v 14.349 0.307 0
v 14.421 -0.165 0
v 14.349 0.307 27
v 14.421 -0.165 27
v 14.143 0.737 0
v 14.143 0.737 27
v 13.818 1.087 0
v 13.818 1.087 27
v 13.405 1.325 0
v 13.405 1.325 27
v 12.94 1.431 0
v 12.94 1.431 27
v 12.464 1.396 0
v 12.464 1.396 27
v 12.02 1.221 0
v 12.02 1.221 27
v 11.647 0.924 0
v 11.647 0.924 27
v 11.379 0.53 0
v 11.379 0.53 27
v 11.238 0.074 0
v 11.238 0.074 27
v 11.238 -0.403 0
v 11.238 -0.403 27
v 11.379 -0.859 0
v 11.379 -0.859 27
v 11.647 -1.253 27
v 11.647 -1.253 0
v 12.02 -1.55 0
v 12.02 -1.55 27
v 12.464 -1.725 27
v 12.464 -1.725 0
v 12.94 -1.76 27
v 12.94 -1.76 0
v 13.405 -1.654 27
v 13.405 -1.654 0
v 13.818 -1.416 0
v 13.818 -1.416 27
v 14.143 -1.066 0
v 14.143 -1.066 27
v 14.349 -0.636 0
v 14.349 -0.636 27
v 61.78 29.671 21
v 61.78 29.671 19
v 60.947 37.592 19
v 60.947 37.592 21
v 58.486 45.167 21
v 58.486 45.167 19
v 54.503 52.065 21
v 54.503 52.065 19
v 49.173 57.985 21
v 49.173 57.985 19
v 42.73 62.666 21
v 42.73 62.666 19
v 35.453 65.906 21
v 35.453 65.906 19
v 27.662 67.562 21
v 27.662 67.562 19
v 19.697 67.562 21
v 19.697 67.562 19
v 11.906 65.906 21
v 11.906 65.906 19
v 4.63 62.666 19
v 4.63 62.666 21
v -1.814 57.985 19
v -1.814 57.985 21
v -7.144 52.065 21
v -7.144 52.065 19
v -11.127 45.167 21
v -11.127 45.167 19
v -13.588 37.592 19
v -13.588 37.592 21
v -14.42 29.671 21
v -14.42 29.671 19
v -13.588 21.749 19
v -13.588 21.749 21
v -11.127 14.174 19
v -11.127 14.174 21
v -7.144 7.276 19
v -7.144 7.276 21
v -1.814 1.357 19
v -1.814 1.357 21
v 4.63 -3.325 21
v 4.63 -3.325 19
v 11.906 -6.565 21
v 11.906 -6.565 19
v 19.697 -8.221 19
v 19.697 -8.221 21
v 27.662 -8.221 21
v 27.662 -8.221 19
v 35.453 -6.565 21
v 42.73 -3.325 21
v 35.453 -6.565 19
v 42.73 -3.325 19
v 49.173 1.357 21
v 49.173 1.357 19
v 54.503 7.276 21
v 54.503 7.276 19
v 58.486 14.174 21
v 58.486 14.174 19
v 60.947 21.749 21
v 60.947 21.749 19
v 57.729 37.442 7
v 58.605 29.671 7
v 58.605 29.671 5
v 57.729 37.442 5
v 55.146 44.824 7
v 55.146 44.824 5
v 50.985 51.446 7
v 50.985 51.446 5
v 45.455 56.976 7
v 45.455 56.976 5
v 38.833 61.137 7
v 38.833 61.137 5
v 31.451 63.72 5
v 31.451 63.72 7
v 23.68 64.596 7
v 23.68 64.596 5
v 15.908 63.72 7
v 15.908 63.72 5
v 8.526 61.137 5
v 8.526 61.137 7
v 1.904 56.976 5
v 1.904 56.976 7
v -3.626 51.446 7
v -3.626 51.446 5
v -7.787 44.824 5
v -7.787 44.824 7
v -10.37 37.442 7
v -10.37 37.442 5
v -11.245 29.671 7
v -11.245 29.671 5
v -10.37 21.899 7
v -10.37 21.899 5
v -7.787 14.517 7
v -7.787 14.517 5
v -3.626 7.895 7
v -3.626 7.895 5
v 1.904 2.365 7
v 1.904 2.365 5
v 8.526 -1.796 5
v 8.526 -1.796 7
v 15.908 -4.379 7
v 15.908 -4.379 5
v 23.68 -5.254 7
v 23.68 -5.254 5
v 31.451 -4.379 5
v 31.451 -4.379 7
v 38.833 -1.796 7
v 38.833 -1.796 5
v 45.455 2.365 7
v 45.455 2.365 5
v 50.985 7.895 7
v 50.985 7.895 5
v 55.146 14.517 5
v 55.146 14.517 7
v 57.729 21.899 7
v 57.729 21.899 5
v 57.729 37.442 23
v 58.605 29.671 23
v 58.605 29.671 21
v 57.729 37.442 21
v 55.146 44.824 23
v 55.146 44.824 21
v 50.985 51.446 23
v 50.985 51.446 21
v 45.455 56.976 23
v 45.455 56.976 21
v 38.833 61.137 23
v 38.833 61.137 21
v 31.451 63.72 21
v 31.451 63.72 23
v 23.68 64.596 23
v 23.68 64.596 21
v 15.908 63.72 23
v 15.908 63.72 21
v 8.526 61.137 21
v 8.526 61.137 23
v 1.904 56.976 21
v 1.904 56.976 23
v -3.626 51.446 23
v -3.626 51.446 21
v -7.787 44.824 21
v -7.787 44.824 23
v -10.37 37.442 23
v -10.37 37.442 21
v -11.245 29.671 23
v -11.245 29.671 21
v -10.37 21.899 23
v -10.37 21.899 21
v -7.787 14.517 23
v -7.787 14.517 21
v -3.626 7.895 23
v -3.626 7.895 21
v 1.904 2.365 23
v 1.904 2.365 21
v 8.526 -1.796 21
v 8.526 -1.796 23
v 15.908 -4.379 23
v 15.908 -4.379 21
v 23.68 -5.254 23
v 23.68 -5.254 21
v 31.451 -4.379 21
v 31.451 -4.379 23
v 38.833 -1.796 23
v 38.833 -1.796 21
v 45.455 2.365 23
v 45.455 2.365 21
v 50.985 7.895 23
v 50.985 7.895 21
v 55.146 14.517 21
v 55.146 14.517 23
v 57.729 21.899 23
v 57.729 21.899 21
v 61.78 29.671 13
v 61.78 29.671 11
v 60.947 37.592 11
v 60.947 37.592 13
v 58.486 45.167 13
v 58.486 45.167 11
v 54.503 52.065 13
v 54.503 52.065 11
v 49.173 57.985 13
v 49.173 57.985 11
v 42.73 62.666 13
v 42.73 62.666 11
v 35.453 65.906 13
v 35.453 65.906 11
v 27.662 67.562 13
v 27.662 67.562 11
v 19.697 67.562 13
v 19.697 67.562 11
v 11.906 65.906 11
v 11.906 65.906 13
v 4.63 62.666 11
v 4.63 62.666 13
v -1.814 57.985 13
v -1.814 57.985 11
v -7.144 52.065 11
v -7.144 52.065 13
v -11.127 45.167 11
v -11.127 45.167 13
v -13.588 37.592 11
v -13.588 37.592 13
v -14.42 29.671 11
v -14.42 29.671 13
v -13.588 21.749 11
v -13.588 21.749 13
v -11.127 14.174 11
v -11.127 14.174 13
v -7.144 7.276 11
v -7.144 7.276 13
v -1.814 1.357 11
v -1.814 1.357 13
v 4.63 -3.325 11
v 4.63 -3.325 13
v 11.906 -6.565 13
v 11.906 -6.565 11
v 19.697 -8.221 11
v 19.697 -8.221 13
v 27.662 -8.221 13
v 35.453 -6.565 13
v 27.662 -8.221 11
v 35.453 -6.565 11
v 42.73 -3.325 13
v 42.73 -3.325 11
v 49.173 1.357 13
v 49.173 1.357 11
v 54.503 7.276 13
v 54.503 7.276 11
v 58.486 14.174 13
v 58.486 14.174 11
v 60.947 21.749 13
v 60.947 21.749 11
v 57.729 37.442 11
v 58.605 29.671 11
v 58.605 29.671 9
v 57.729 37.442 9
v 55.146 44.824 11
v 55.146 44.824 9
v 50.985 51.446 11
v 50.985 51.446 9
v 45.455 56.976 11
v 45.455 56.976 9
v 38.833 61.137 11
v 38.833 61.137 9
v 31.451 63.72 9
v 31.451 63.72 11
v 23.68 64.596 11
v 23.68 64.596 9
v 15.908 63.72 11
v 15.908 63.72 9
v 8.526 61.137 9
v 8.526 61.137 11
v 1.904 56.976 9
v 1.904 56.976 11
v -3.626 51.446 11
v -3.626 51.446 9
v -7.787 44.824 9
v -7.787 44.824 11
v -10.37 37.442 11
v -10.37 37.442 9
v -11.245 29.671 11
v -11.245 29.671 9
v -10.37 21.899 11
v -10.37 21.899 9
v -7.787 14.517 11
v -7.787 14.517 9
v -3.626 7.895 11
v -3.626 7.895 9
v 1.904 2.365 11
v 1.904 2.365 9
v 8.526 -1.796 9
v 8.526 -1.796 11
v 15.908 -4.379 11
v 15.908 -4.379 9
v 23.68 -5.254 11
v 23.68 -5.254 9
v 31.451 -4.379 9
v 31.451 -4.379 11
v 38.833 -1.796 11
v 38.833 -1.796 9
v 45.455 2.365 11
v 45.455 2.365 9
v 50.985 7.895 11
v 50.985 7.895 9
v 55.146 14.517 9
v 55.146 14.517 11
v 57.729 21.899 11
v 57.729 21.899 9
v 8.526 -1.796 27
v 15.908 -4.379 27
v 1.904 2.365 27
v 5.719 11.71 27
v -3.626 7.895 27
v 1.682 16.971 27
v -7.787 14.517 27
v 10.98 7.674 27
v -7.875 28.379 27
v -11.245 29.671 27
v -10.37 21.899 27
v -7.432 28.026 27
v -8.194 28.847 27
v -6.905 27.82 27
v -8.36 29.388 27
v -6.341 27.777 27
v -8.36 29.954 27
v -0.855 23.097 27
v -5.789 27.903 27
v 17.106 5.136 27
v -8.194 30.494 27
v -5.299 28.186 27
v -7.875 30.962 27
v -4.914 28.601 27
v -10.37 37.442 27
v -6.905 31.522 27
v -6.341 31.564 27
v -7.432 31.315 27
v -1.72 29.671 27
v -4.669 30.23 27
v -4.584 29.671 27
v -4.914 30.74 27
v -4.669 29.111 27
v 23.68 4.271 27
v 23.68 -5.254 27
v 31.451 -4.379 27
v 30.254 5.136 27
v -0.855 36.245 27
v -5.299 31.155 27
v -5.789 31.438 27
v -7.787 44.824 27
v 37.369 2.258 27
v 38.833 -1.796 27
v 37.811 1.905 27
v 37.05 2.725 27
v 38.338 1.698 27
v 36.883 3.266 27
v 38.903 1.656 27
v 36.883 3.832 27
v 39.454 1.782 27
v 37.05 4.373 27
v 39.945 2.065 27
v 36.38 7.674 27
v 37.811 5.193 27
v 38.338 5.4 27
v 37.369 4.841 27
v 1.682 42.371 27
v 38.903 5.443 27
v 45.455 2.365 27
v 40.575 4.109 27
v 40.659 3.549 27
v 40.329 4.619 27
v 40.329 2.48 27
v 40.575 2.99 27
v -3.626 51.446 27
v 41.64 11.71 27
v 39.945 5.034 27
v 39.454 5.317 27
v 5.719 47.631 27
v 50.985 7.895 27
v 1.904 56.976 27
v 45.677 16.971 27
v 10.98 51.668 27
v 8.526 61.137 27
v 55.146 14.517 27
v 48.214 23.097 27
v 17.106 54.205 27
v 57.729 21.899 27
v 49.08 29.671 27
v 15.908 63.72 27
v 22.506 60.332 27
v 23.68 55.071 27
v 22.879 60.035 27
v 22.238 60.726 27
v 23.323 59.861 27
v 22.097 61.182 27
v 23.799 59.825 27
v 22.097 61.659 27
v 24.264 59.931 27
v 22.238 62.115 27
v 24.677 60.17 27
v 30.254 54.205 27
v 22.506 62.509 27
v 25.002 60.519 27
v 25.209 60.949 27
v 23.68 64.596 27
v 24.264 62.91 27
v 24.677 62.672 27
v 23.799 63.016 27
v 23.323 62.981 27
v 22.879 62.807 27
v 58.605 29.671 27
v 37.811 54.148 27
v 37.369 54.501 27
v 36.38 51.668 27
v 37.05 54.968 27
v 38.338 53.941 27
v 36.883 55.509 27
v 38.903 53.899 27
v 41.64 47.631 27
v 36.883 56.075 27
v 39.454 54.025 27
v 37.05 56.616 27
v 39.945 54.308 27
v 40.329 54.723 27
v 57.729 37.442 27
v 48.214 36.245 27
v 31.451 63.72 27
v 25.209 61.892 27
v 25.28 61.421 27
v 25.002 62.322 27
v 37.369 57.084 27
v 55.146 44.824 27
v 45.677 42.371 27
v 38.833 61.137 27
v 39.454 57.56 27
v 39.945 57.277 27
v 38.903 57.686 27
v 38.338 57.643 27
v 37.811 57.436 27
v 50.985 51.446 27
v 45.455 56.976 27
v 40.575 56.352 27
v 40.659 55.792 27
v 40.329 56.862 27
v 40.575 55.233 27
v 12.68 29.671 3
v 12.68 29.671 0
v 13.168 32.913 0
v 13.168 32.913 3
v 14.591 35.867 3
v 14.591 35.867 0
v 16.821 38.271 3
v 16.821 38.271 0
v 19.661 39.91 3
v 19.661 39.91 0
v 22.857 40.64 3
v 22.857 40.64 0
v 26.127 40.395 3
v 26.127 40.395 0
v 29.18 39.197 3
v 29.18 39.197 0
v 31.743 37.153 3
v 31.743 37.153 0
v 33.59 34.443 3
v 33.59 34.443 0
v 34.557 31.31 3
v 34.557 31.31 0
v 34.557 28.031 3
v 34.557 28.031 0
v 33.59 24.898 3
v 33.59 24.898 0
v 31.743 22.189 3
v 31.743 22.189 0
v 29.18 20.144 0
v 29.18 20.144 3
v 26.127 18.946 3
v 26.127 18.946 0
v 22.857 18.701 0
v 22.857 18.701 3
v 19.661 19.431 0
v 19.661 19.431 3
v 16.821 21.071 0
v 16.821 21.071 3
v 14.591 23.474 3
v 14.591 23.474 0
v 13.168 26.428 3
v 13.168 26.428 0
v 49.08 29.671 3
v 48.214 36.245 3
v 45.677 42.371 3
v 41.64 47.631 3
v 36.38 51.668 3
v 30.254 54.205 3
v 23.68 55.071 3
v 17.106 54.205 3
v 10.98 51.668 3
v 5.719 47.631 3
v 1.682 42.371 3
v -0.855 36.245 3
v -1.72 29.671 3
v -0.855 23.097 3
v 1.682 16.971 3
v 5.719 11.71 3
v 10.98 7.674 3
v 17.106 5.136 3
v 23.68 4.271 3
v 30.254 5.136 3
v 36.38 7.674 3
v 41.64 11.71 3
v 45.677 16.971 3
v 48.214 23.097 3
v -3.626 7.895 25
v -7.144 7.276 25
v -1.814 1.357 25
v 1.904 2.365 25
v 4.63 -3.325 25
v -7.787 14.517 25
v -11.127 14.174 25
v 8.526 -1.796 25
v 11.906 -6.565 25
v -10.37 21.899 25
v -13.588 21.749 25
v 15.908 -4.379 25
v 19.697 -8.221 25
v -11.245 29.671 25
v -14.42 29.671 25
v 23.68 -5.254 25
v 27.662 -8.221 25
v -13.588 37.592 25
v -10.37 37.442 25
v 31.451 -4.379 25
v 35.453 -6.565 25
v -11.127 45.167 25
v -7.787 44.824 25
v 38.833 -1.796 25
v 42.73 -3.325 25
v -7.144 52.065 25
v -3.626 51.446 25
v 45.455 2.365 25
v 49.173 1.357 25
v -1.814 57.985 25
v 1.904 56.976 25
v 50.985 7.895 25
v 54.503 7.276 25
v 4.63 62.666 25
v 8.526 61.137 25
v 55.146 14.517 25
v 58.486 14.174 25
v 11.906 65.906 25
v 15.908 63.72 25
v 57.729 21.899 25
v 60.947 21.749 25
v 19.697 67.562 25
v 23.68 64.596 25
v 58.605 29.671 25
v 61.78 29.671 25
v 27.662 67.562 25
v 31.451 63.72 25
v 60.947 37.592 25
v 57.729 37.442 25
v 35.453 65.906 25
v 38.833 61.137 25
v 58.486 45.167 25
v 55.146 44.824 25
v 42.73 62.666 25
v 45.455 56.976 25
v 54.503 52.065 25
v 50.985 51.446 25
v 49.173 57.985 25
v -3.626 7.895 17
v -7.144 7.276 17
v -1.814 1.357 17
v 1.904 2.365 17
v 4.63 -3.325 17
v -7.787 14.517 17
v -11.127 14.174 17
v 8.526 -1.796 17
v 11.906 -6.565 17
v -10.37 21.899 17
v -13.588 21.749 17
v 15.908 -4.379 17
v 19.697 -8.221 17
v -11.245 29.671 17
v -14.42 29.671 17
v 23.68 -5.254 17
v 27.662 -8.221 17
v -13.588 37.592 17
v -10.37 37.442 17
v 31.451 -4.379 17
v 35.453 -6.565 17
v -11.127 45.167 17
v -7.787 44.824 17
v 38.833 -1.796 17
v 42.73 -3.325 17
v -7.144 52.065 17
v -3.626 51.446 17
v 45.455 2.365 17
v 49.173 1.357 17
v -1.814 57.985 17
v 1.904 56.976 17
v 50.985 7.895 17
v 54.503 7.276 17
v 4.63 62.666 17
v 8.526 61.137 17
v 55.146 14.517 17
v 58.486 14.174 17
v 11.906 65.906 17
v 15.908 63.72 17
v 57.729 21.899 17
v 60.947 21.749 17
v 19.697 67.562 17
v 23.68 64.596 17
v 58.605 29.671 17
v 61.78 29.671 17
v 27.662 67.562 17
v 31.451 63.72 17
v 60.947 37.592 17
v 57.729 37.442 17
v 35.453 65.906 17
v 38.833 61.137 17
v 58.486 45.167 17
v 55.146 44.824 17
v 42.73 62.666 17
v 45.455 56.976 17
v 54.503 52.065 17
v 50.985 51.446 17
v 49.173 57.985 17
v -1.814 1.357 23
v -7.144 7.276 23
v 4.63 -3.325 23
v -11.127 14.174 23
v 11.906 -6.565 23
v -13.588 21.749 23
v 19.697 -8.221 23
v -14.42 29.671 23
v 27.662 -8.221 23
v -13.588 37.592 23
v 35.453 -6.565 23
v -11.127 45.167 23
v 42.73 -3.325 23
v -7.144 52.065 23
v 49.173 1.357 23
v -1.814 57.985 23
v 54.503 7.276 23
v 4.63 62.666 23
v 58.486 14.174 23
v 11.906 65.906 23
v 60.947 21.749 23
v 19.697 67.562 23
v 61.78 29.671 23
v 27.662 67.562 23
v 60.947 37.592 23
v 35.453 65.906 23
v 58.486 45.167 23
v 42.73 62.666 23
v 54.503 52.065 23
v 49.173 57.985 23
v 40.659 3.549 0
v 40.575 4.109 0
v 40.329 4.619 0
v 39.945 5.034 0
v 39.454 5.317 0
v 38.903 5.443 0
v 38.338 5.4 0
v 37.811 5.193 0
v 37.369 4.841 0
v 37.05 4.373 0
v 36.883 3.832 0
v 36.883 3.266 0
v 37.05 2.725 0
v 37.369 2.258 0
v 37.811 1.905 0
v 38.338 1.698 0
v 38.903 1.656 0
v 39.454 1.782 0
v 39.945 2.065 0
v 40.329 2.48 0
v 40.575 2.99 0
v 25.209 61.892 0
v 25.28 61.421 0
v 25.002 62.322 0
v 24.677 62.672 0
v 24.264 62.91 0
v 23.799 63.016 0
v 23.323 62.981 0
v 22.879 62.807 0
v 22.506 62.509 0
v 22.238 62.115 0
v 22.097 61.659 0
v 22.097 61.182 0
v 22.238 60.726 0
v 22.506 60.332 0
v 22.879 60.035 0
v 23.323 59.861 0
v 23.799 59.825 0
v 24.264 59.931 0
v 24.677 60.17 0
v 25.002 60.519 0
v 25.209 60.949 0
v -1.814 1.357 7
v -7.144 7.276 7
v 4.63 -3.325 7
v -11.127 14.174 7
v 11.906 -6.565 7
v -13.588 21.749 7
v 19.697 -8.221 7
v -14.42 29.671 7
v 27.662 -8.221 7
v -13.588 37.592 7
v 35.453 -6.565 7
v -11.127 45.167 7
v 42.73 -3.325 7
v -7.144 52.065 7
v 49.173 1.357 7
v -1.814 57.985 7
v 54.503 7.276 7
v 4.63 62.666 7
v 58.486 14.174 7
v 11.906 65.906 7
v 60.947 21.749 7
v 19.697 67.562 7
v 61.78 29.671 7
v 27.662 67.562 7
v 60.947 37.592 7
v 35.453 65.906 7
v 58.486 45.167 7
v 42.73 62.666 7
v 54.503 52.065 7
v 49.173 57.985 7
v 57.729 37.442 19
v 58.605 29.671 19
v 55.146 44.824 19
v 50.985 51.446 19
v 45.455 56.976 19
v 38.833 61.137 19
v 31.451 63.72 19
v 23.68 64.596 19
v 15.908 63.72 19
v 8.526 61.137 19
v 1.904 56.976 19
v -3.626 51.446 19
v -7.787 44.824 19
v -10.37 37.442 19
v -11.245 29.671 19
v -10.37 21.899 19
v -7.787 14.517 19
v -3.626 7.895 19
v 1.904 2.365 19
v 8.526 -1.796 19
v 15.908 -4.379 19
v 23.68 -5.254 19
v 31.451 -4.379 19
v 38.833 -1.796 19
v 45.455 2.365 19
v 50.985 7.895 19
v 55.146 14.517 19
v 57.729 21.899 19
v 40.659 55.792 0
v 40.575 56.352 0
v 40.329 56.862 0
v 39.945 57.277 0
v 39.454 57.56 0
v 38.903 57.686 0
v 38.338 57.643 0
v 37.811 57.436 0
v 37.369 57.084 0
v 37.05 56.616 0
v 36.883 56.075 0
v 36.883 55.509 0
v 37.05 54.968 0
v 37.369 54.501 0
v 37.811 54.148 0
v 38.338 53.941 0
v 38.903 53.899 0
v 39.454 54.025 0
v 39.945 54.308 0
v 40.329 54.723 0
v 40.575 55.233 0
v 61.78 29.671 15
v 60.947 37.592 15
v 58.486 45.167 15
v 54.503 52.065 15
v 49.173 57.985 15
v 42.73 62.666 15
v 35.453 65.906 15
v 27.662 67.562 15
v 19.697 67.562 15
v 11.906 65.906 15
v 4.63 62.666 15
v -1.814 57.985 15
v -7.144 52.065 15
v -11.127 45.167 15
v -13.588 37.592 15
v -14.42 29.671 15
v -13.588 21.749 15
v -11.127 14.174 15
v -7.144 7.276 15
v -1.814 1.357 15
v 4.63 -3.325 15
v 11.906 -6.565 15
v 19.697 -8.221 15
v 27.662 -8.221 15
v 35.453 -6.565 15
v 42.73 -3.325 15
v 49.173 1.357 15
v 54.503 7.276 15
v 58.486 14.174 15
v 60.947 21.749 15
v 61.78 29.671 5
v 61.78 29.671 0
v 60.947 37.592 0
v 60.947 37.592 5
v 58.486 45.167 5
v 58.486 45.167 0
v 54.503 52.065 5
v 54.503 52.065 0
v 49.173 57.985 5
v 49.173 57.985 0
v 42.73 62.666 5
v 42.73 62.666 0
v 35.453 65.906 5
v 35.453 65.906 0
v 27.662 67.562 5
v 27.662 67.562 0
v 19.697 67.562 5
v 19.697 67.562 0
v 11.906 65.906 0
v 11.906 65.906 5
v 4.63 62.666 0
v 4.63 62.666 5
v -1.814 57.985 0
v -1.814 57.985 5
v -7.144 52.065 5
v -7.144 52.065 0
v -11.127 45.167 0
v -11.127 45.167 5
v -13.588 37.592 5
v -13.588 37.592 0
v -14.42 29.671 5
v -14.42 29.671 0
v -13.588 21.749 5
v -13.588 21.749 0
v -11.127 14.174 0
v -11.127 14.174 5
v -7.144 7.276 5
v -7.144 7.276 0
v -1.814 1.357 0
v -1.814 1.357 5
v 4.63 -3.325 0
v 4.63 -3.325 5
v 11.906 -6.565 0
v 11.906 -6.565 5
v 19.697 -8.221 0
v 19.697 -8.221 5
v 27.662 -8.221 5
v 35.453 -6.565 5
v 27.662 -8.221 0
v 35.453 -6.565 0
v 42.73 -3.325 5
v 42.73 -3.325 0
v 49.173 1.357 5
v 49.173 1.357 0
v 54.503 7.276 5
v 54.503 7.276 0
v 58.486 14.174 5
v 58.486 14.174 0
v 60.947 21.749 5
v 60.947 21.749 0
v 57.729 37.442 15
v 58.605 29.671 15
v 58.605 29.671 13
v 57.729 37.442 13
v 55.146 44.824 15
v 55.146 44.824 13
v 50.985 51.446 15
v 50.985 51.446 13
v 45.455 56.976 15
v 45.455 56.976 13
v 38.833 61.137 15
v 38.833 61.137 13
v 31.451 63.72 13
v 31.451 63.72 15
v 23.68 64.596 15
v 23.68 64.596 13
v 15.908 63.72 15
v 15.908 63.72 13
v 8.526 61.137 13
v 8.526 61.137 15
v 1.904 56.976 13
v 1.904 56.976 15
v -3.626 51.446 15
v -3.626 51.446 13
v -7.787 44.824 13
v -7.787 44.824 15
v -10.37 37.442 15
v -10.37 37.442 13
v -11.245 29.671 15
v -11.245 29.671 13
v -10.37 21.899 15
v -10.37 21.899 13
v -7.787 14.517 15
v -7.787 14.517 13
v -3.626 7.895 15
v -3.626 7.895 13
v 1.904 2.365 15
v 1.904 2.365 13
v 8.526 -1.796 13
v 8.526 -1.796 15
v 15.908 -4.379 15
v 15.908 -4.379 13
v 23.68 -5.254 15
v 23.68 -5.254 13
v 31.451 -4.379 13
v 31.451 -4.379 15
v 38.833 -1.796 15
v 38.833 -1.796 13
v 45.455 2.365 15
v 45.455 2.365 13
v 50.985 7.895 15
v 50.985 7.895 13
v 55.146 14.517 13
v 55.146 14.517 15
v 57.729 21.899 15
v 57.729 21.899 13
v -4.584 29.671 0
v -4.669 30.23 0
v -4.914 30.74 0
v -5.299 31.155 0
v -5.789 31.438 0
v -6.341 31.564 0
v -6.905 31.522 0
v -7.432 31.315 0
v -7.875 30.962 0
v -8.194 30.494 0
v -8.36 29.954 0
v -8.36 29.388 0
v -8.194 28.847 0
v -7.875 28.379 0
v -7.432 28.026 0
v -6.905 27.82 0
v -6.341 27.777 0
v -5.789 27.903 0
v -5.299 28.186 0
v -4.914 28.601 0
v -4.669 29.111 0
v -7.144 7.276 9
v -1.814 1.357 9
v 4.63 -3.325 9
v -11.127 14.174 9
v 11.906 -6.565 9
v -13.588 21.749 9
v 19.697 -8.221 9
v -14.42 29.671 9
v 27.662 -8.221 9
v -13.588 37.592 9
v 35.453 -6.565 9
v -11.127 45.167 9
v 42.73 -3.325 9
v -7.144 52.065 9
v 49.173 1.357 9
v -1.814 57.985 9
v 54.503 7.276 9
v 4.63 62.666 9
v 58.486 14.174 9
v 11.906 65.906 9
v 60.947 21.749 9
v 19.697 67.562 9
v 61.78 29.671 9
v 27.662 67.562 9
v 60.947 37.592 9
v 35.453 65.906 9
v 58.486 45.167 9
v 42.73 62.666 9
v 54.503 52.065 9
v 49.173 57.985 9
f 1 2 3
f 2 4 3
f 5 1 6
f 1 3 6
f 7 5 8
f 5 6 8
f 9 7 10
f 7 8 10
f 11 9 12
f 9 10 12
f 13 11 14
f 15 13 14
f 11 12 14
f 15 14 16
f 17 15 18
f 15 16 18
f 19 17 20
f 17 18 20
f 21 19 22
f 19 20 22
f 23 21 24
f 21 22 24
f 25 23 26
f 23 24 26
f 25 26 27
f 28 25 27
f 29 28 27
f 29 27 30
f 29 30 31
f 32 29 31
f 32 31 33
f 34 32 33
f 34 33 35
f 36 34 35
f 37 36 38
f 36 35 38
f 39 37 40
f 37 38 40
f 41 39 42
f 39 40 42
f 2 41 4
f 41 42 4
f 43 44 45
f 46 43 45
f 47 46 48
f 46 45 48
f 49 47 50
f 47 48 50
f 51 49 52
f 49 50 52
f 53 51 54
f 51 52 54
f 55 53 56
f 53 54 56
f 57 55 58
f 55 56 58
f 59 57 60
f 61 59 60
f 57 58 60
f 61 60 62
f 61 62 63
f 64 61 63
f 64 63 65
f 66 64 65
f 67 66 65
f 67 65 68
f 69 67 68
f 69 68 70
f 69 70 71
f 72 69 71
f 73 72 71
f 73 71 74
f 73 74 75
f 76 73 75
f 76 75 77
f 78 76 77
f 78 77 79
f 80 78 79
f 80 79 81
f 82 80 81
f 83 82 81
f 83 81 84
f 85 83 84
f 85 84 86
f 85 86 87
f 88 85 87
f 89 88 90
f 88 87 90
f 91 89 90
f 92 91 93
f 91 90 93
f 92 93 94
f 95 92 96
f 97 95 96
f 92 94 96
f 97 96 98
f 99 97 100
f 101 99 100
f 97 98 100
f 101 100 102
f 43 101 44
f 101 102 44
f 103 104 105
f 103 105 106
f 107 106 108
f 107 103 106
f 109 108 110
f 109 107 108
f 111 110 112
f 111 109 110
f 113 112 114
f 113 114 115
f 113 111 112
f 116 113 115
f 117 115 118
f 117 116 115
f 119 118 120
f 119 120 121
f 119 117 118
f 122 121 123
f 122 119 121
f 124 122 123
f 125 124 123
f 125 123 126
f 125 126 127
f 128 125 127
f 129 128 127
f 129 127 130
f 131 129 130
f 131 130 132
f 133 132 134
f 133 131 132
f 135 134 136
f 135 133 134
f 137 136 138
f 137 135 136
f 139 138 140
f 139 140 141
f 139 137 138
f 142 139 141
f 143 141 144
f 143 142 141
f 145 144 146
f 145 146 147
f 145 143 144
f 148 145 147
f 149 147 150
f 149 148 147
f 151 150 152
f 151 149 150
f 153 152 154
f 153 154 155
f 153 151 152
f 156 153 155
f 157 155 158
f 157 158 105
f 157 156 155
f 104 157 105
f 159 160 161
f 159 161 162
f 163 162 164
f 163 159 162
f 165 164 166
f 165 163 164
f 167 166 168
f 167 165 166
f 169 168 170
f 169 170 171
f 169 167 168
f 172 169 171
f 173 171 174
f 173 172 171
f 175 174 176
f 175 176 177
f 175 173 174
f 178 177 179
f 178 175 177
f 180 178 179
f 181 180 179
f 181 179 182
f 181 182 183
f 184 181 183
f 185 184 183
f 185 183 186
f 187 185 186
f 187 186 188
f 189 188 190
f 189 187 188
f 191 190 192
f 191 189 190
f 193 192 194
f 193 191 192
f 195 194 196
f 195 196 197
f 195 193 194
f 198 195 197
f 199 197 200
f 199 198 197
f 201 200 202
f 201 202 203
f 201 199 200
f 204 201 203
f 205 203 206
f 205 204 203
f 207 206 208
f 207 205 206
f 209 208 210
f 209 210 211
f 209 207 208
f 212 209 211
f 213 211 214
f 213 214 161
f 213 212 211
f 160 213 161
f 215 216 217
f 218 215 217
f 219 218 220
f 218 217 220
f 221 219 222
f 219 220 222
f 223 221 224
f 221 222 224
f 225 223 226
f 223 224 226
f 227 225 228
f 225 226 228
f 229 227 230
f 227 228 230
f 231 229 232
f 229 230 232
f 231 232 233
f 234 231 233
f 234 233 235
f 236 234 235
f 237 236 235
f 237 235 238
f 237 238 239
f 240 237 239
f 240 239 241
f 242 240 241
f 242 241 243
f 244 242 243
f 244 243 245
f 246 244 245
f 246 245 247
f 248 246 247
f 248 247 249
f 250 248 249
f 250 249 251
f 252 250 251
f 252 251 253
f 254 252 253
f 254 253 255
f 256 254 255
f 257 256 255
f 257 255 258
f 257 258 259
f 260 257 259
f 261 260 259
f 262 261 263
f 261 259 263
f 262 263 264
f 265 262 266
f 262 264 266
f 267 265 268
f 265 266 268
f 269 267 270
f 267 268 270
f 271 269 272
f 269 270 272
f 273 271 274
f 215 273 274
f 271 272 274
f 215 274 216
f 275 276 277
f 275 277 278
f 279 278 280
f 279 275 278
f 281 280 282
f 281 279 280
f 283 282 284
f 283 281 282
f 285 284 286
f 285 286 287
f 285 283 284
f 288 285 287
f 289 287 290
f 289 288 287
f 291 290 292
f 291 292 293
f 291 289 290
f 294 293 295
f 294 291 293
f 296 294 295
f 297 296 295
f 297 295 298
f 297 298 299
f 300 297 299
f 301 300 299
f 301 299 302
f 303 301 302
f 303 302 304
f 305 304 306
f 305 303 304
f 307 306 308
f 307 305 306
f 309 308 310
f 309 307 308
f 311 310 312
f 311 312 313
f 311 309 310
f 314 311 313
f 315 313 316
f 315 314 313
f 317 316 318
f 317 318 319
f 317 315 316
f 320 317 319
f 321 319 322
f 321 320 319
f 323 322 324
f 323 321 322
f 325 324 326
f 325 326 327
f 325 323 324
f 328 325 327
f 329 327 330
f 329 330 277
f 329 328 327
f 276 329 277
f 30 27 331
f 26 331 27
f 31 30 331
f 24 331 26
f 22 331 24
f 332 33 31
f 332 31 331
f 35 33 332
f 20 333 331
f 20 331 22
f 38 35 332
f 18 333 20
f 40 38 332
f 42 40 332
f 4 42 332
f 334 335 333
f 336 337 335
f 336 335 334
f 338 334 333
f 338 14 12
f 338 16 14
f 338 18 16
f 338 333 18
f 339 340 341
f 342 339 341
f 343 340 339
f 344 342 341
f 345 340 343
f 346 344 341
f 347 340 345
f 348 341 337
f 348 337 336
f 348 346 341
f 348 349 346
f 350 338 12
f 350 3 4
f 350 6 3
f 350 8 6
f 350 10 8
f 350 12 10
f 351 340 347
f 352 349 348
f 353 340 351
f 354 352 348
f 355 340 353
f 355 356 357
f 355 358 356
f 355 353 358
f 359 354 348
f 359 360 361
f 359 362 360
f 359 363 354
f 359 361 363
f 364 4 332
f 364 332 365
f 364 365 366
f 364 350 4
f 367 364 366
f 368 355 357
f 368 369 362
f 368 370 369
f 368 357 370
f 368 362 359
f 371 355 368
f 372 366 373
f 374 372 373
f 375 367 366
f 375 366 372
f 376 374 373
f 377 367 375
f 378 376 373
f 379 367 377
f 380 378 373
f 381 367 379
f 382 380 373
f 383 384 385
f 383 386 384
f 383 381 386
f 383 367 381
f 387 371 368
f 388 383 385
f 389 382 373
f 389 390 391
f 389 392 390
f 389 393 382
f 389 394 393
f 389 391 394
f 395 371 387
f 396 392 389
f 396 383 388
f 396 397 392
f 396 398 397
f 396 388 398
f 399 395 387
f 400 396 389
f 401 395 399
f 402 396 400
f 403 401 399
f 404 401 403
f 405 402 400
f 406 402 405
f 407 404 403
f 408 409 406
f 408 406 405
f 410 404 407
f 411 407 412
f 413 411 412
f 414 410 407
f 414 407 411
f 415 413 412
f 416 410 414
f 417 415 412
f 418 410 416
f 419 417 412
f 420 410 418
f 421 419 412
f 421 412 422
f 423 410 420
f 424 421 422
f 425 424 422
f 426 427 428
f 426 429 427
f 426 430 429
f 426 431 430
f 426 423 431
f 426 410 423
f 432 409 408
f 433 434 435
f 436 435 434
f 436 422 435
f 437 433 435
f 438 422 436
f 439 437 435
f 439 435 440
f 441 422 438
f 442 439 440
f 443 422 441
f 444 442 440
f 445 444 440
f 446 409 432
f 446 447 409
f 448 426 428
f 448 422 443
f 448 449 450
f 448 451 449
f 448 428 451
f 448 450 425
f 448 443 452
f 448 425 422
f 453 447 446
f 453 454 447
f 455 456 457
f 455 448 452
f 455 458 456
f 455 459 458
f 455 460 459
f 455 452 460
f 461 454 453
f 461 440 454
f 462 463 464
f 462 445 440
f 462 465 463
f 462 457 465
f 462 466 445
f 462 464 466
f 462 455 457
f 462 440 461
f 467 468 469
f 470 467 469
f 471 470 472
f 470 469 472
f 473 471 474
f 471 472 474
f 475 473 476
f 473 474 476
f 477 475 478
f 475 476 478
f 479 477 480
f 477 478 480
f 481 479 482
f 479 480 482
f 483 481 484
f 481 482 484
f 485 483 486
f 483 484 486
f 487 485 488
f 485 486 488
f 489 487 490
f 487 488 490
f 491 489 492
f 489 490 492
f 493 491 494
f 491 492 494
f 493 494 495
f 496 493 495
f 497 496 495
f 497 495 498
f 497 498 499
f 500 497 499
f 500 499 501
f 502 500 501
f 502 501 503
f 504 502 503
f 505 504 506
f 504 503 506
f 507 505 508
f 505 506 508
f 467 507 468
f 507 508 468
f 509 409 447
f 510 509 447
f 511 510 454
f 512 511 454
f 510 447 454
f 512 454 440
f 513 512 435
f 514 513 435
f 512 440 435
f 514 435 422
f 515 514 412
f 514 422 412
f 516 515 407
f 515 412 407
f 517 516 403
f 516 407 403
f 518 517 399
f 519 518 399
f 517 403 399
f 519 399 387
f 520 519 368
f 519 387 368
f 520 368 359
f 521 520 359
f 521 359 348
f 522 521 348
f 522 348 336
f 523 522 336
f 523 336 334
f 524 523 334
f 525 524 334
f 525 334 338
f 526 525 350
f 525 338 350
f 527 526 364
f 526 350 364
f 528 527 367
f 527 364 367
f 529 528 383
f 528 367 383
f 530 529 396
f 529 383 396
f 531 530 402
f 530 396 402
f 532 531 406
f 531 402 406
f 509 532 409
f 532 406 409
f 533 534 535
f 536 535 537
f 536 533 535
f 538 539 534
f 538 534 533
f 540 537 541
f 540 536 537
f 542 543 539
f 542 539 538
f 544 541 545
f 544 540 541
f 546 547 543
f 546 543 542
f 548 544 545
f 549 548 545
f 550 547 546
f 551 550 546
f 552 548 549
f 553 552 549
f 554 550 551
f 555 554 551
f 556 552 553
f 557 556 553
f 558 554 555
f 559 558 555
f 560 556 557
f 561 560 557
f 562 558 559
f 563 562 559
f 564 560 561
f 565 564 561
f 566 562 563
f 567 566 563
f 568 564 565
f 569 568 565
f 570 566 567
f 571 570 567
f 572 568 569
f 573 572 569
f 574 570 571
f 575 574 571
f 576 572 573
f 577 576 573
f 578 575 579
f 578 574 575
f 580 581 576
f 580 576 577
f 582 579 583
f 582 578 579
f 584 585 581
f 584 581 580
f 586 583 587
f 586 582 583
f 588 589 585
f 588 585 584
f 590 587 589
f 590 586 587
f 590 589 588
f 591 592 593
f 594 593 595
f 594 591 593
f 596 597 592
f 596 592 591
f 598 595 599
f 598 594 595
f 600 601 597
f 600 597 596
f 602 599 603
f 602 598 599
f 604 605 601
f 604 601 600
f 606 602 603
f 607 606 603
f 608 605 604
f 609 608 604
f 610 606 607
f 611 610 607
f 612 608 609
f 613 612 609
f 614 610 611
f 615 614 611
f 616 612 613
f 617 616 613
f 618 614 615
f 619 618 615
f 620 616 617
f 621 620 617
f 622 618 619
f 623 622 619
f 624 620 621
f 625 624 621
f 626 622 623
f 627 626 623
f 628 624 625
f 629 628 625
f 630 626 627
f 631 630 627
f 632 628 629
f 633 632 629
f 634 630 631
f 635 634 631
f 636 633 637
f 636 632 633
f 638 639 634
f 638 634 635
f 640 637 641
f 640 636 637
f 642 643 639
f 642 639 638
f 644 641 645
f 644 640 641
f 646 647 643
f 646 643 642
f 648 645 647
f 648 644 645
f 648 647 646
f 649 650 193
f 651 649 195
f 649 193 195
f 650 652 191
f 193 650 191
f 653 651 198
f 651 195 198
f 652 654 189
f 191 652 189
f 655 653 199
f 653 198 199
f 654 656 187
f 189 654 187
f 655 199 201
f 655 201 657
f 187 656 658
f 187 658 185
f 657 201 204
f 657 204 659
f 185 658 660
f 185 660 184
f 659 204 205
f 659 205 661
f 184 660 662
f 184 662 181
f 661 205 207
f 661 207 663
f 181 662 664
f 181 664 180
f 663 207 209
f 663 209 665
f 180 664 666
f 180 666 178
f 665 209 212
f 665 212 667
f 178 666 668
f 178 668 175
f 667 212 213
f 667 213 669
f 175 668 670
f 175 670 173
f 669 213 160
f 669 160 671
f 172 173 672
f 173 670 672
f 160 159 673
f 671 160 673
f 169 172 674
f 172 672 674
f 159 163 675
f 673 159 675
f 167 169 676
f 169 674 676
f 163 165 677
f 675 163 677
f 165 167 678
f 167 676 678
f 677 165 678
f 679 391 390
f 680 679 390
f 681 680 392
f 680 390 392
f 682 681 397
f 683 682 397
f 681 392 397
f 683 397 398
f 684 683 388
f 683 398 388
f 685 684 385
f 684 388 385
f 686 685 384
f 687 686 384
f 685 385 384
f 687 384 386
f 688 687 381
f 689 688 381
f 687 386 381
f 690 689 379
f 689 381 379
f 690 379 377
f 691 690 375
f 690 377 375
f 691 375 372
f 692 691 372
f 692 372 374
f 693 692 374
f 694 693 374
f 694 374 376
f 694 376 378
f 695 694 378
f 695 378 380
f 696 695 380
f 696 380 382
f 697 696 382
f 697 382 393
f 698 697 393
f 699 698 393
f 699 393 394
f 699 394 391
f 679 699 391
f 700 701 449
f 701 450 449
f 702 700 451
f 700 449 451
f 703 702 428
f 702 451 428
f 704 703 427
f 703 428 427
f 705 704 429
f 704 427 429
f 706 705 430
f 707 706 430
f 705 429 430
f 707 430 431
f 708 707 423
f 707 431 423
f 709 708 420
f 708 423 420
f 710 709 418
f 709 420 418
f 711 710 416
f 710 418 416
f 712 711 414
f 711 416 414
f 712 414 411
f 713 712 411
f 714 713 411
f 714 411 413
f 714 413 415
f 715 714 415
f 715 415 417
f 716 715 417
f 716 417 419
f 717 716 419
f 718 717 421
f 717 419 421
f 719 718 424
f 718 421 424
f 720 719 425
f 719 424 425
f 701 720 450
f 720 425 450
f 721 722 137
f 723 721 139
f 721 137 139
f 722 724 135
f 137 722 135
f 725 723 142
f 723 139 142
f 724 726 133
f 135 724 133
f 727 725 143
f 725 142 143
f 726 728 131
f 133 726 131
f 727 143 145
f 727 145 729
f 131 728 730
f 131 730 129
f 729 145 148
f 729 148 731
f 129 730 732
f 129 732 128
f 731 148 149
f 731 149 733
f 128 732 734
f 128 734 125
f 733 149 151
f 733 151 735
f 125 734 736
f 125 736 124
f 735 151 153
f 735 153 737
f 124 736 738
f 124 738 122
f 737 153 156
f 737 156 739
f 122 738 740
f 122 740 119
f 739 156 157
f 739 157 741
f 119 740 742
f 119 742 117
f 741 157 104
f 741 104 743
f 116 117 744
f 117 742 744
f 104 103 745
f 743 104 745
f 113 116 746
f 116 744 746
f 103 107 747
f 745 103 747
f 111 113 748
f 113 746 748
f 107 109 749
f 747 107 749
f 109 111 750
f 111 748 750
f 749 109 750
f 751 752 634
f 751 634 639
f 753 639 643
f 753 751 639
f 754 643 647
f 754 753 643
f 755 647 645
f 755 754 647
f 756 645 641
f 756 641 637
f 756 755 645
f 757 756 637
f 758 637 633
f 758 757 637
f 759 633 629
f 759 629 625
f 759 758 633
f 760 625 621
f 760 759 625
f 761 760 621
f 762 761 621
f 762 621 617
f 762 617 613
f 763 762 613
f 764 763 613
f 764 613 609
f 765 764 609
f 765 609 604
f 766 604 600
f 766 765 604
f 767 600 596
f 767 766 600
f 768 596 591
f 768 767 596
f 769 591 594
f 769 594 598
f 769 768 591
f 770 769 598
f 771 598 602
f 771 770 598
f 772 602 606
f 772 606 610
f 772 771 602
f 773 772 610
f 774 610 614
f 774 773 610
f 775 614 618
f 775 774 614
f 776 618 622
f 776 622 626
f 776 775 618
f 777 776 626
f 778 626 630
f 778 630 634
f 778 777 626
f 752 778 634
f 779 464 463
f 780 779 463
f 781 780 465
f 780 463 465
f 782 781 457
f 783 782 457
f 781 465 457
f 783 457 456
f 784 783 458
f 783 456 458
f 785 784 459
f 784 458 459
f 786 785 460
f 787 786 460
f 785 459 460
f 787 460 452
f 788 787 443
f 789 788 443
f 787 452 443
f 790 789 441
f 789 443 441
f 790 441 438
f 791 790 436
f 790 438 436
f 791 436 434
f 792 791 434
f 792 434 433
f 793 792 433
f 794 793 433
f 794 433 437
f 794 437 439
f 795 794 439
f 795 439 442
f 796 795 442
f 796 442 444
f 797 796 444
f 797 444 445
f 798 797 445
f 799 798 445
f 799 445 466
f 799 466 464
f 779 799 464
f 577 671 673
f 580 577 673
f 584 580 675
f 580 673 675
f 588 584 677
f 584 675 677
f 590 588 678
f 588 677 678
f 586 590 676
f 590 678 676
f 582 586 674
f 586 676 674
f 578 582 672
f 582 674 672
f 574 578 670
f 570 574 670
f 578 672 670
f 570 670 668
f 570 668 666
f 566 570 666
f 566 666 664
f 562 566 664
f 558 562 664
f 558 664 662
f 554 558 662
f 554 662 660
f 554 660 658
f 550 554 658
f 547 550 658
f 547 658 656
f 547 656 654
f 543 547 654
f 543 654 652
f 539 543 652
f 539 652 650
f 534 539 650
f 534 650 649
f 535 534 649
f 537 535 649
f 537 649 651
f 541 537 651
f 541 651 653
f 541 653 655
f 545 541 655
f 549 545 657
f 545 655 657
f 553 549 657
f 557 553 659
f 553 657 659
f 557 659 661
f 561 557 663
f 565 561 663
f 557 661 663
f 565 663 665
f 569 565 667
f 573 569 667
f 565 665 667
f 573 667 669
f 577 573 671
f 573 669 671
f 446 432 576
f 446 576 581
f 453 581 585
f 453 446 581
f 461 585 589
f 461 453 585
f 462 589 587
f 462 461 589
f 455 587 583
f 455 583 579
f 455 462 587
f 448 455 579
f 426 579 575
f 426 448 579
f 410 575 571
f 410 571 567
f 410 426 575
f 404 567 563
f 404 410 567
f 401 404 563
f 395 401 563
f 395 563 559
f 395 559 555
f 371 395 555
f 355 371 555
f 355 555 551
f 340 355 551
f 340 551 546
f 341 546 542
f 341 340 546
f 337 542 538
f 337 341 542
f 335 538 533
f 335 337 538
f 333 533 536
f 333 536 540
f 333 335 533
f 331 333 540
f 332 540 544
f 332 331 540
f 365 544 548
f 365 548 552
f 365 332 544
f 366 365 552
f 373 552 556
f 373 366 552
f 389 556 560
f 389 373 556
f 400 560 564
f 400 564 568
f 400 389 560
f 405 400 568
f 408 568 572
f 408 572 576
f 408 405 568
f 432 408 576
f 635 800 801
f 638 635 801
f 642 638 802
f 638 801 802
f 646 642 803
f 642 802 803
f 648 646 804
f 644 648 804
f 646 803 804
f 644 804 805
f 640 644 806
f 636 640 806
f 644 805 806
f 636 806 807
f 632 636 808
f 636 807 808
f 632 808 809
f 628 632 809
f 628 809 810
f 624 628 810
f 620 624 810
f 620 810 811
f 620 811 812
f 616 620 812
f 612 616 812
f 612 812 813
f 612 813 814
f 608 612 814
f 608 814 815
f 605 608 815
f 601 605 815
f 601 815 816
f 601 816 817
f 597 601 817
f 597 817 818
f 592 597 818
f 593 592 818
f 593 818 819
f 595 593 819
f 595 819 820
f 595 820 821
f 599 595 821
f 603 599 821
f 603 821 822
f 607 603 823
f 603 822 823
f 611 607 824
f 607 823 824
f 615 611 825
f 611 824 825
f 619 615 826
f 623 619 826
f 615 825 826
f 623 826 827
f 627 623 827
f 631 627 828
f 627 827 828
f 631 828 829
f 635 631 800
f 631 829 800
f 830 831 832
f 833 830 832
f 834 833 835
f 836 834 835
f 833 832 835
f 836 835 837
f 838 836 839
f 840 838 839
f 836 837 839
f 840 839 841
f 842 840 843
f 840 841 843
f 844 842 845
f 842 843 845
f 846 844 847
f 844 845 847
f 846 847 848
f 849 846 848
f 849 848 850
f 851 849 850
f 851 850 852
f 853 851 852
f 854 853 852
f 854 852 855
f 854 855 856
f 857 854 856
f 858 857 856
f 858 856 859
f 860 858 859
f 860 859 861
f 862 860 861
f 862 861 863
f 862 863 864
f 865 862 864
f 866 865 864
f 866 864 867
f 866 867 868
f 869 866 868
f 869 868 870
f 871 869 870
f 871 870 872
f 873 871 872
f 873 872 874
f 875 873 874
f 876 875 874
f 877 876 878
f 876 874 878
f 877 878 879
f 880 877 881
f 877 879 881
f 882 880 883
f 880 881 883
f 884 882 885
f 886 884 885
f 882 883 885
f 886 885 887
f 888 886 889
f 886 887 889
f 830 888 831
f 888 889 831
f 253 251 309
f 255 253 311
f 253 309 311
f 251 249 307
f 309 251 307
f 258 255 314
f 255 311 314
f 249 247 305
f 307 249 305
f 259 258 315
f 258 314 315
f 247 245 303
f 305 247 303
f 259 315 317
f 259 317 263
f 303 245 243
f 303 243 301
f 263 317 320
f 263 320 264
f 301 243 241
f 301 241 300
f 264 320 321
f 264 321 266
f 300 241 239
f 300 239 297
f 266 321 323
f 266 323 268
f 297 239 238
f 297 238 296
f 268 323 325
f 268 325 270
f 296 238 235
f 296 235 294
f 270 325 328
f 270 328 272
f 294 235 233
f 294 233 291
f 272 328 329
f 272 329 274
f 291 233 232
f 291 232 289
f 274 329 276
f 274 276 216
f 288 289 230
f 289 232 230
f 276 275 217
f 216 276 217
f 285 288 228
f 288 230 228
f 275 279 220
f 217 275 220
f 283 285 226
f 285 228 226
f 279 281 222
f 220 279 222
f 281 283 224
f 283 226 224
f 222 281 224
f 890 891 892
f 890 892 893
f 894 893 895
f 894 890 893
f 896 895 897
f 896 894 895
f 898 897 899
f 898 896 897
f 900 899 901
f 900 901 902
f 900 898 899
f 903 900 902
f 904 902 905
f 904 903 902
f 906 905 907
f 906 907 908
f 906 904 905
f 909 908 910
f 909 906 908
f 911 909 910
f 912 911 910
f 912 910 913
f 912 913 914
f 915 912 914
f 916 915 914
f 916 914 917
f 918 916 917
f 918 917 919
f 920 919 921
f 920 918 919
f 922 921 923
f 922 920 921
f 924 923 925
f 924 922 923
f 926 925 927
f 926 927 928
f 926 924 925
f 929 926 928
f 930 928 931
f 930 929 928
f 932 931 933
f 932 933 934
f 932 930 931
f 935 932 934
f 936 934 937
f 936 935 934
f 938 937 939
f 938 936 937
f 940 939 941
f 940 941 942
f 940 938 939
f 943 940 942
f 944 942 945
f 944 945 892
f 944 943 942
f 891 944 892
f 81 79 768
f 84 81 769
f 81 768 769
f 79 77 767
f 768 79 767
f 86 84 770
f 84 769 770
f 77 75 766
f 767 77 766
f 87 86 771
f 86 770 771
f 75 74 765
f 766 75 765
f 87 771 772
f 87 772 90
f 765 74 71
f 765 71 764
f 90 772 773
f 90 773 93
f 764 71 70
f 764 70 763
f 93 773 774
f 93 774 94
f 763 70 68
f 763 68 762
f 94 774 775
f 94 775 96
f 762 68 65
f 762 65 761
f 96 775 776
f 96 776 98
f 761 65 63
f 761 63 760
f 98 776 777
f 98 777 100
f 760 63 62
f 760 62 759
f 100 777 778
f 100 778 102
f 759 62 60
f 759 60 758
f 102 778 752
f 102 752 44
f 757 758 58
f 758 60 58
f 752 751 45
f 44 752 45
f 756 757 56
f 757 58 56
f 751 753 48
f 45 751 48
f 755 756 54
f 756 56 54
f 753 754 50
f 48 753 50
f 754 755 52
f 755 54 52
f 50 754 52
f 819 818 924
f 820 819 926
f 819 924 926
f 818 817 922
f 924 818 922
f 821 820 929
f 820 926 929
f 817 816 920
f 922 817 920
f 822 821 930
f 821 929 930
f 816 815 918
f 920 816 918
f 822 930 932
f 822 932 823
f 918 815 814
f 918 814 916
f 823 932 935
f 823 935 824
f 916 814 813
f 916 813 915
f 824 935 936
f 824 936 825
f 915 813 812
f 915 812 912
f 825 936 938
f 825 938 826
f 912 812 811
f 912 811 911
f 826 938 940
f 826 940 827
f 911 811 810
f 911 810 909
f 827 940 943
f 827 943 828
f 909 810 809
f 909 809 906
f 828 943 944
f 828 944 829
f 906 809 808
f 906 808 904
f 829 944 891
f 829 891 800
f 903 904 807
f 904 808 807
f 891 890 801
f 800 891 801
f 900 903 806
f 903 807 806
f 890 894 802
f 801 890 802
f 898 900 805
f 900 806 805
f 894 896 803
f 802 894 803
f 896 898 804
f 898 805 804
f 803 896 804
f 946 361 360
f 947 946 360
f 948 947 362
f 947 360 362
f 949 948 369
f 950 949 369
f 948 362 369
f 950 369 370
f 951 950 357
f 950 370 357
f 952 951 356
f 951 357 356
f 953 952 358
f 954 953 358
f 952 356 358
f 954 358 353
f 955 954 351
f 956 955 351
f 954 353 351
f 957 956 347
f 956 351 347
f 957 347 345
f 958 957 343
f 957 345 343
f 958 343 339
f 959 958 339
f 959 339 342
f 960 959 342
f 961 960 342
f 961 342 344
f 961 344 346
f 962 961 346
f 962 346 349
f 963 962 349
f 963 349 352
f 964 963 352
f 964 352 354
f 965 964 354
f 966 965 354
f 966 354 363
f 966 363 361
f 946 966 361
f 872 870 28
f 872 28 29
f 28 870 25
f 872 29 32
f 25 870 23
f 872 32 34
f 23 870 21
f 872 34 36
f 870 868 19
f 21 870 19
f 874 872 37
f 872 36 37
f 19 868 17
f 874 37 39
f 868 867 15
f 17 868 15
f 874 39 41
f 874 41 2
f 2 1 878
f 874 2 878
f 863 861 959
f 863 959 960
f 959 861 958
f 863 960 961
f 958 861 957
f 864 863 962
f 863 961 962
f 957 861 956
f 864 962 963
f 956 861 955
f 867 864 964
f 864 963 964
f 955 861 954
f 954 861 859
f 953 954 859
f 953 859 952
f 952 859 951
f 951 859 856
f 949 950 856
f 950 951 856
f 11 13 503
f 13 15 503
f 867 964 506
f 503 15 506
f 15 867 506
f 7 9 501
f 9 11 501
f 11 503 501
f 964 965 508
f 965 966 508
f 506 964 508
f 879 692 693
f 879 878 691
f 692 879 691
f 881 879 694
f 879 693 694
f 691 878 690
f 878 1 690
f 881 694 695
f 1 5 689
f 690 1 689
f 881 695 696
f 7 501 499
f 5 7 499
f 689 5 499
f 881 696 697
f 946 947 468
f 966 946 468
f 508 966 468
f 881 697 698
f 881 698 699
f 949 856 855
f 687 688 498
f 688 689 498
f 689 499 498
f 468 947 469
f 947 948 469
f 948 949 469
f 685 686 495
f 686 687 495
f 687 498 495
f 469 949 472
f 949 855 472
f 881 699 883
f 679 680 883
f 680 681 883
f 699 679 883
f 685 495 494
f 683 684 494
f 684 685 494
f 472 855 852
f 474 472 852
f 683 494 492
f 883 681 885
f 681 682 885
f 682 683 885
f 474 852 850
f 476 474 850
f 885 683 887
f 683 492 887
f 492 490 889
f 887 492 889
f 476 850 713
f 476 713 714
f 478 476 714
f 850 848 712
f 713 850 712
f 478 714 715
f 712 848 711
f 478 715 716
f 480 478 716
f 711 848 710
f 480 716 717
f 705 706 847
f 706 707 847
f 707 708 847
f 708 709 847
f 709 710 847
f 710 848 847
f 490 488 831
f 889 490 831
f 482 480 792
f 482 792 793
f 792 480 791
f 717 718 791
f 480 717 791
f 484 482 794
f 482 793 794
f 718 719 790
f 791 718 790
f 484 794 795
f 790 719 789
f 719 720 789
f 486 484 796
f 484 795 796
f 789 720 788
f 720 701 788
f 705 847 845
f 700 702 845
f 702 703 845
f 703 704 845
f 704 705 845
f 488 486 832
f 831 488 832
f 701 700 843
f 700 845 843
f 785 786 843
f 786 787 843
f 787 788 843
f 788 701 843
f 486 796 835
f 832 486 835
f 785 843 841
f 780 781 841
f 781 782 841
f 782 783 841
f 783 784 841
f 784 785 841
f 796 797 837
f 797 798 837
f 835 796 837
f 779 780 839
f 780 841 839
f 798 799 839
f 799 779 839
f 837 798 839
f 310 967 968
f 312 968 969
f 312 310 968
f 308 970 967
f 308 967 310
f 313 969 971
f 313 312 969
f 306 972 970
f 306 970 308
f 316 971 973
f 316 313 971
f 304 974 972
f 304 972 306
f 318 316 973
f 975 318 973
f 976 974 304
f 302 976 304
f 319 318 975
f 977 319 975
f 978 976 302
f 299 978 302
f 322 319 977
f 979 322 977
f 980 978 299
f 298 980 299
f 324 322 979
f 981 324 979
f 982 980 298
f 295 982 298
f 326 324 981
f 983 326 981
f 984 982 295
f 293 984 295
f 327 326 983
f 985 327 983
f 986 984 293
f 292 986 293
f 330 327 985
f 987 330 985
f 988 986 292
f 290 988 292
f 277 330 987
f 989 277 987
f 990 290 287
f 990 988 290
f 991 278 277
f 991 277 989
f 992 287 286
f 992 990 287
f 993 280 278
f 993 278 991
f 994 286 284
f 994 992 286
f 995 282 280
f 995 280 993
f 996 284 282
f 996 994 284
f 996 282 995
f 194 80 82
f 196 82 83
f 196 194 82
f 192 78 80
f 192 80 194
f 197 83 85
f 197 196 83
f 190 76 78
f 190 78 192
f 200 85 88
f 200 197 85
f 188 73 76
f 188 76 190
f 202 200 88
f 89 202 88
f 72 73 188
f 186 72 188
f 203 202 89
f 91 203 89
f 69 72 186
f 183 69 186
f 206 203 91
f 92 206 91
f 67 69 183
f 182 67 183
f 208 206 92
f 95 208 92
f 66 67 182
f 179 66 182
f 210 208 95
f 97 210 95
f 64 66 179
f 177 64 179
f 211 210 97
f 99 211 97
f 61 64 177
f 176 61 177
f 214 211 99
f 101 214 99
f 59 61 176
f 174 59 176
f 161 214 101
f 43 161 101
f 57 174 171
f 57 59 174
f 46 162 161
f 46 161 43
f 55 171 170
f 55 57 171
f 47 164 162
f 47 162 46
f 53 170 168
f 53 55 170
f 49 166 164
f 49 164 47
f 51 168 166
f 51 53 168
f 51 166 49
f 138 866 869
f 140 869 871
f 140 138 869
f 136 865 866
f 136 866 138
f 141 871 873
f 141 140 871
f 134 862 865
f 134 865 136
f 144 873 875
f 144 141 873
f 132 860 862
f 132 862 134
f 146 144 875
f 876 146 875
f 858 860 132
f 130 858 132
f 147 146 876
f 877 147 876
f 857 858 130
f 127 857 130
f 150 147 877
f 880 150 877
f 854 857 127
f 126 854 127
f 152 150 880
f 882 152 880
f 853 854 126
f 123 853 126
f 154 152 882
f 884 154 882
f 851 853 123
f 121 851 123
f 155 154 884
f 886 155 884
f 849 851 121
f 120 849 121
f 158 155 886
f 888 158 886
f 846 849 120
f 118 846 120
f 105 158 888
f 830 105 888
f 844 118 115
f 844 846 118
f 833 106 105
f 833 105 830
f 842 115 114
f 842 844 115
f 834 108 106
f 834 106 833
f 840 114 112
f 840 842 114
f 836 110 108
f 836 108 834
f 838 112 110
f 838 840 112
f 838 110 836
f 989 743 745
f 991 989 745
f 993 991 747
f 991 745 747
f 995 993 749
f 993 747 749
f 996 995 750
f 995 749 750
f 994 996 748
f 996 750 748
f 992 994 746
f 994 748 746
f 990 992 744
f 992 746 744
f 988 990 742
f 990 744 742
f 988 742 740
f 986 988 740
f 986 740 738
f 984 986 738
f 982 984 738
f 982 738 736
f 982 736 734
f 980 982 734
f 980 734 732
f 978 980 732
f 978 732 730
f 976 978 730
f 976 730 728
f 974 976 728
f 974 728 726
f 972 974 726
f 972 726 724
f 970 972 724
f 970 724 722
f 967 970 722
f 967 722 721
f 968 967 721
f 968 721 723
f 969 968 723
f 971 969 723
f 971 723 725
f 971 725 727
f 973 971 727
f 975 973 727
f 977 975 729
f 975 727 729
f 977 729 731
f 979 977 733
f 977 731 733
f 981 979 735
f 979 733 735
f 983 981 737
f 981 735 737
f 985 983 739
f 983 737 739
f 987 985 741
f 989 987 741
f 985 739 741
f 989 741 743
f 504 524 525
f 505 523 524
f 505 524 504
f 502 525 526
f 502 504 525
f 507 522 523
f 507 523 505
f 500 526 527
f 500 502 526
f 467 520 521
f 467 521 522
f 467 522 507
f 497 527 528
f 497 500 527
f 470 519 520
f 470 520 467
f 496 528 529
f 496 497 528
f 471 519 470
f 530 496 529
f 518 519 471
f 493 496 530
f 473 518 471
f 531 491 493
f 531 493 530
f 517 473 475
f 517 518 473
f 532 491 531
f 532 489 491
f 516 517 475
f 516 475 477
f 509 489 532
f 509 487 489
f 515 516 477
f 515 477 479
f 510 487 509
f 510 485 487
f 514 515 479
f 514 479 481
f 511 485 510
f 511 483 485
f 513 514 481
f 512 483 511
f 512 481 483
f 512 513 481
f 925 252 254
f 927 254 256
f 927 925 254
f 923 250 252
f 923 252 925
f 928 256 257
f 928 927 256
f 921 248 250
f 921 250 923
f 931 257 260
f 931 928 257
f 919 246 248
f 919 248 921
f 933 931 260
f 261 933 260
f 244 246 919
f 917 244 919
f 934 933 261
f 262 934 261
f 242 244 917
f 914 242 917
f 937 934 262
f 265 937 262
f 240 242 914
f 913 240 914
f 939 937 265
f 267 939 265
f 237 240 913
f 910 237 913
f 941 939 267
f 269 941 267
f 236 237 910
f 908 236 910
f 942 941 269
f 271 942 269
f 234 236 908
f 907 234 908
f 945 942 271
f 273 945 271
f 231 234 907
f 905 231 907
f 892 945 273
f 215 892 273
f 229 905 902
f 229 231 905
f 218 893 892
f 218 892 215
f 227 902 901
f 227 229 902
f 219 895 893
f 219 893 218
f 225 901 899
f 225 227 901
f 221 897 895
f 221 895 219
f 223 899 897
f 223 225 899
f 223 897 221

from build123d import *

# Parameters (mm, degrees)
ESQUISSE1_R                          = 38.1
BOSS_EXTRU_1_DEPTH                   = 27
ESQUISSE3_R                          = 25.4
ENL_V_MAT_EXTRU_2_DEPTH              = 24
ESQUISSE5_R                          = 11
ENL_V_MAT_EXTRU_3_DEPTH              = 3
ESQUISSE8_R                          = 38.1
ESQUISSE8_R_2                        = 34.925
ENL_V_MAT_EXTRU_5_DEPTH              = 2
R_P_TITION_LIN_AIRE1_COUNT           = 6
R_P_TITION_LIN_AIRE1_PITCH           = 4
D_GAGEMENT_61_D                      = 3.7973
F_1_8_0_126_TROUS_DE_CENTRAGE1_D     = 3.2004
F_1_8_0_126_TROUS_DE_CENTRAGE1_DEPTH = 27
F_1_8_0_126_TROUS_DE_CENTRAGE1_TIP   = 0.961497163


with BuildPart() as part:
    # Esquisse1 → Boss.-Extru.1 (new body)
    with BuildSketch(Plane.XY):
        with Locations((23.679503876, 29.670703652)):
            Circle(ESQUISSE1_R)
    extrude(amount=BOSS_EXTRU_1_DEPTH)

    # Esquisse3 → Enlèv. mat.-Extru.2 (cut)
    with BuildSketch(Plane.XY.offset(27)):
        with Locations((23.679503876, 29.670703652)):
            Circle(ESQUISSE3_R)
    extrude(amount=-ENL_V_MAT_EXTRU_2_DEPTH, mode=Mode.SUBTRACT)

    # Esquisse5 → Enlèv. mat.-Extru.3 (cut)
    with BuildSketch(Plane(origin=(0, 0, 0), x_dir=(-1, 0, 0), z_dir=(0, 0, -1))):
        with Locations((-23.679503876, 29.670703652)):
            Circle(ESQUISSE5_R)
    extrude(amount=-ENL_V_MAT_EXTRU_3_DEPTH, mode=Mode.SUBTRACT)

    # Esquisse8 → Enlèv. mat.-Extru.5 (cut)
    with BuildSketch(Plane.XY.offset(27)):
        with Locations((23.679503876, 29.670703652)):
            Circle(ESQUISSE8_R)
        with Locations((23.679503876, 29.670703652)):
            Circle(ESQUISSE8_R_2, mode=Mode.SUBTRACT)
    enl_v_mat_extru_5 = extrude(amount=-ENL_V_MAT_EXTRU_5_DEPTH, mode=Mode.SUBTRACT)

    # Répétition linéaire1: Enlèv. mat.-Extru.5 ×6
    with Locations(*[(0, 0, -i * R_P_TITION_LIN_AIRE1_PITCH) for i in range(1, R_P_TITION_LIN_AIRE1_COUNT)]):
        add(enl_v_mat_extru_5, mode=Mode.SUBTRACT)

    # Dégagement #61 (through all)
    with Locations(Plane(origin=(0, 0, 0), x_dir=(-1, 0, 0), z_dir=(0, 0, -1))):
        with Locations((-38.760753876, 55.792194893), (6.482996124, 29.670703652), (-38.760753876, 3.54921241)):
            Hole(D_GAGEMENT_61_D / 2)

    # 1/8 (0.126) Trous de centrage1
    with Locations(Plane(origin=(0, 0, 0), x_dir=(-1, 0, 0), z_dir=(0, 0, -1))):
        with Locations((-23.679503876, 61.420703652), (-12.820364325, -0.164537058)):
            Hole(F_1_8_0_126_TROUS_DE_CENTRAGE1_D / 2, depth=F_1_8_0_126_TROUS_DE_CENTRAGE1_DEPTH)
            with Locations((0, 0, -(F_1_8_0_126_TROUS_DE_CENTRAGE1_DEPTH + F_1_8_0_126_TROUS_DE_CENTRAGE1_TIP / 2))):  # 118° drill point
                Cone(0, F_1_8_0_126_TROUS_DE_CENTRAGE1_D / 2, F_1_8_0_126_TROUS_DE_CENTRAGE1_TIP, mode=Mode.SUBTRACT)


solid = part.part
